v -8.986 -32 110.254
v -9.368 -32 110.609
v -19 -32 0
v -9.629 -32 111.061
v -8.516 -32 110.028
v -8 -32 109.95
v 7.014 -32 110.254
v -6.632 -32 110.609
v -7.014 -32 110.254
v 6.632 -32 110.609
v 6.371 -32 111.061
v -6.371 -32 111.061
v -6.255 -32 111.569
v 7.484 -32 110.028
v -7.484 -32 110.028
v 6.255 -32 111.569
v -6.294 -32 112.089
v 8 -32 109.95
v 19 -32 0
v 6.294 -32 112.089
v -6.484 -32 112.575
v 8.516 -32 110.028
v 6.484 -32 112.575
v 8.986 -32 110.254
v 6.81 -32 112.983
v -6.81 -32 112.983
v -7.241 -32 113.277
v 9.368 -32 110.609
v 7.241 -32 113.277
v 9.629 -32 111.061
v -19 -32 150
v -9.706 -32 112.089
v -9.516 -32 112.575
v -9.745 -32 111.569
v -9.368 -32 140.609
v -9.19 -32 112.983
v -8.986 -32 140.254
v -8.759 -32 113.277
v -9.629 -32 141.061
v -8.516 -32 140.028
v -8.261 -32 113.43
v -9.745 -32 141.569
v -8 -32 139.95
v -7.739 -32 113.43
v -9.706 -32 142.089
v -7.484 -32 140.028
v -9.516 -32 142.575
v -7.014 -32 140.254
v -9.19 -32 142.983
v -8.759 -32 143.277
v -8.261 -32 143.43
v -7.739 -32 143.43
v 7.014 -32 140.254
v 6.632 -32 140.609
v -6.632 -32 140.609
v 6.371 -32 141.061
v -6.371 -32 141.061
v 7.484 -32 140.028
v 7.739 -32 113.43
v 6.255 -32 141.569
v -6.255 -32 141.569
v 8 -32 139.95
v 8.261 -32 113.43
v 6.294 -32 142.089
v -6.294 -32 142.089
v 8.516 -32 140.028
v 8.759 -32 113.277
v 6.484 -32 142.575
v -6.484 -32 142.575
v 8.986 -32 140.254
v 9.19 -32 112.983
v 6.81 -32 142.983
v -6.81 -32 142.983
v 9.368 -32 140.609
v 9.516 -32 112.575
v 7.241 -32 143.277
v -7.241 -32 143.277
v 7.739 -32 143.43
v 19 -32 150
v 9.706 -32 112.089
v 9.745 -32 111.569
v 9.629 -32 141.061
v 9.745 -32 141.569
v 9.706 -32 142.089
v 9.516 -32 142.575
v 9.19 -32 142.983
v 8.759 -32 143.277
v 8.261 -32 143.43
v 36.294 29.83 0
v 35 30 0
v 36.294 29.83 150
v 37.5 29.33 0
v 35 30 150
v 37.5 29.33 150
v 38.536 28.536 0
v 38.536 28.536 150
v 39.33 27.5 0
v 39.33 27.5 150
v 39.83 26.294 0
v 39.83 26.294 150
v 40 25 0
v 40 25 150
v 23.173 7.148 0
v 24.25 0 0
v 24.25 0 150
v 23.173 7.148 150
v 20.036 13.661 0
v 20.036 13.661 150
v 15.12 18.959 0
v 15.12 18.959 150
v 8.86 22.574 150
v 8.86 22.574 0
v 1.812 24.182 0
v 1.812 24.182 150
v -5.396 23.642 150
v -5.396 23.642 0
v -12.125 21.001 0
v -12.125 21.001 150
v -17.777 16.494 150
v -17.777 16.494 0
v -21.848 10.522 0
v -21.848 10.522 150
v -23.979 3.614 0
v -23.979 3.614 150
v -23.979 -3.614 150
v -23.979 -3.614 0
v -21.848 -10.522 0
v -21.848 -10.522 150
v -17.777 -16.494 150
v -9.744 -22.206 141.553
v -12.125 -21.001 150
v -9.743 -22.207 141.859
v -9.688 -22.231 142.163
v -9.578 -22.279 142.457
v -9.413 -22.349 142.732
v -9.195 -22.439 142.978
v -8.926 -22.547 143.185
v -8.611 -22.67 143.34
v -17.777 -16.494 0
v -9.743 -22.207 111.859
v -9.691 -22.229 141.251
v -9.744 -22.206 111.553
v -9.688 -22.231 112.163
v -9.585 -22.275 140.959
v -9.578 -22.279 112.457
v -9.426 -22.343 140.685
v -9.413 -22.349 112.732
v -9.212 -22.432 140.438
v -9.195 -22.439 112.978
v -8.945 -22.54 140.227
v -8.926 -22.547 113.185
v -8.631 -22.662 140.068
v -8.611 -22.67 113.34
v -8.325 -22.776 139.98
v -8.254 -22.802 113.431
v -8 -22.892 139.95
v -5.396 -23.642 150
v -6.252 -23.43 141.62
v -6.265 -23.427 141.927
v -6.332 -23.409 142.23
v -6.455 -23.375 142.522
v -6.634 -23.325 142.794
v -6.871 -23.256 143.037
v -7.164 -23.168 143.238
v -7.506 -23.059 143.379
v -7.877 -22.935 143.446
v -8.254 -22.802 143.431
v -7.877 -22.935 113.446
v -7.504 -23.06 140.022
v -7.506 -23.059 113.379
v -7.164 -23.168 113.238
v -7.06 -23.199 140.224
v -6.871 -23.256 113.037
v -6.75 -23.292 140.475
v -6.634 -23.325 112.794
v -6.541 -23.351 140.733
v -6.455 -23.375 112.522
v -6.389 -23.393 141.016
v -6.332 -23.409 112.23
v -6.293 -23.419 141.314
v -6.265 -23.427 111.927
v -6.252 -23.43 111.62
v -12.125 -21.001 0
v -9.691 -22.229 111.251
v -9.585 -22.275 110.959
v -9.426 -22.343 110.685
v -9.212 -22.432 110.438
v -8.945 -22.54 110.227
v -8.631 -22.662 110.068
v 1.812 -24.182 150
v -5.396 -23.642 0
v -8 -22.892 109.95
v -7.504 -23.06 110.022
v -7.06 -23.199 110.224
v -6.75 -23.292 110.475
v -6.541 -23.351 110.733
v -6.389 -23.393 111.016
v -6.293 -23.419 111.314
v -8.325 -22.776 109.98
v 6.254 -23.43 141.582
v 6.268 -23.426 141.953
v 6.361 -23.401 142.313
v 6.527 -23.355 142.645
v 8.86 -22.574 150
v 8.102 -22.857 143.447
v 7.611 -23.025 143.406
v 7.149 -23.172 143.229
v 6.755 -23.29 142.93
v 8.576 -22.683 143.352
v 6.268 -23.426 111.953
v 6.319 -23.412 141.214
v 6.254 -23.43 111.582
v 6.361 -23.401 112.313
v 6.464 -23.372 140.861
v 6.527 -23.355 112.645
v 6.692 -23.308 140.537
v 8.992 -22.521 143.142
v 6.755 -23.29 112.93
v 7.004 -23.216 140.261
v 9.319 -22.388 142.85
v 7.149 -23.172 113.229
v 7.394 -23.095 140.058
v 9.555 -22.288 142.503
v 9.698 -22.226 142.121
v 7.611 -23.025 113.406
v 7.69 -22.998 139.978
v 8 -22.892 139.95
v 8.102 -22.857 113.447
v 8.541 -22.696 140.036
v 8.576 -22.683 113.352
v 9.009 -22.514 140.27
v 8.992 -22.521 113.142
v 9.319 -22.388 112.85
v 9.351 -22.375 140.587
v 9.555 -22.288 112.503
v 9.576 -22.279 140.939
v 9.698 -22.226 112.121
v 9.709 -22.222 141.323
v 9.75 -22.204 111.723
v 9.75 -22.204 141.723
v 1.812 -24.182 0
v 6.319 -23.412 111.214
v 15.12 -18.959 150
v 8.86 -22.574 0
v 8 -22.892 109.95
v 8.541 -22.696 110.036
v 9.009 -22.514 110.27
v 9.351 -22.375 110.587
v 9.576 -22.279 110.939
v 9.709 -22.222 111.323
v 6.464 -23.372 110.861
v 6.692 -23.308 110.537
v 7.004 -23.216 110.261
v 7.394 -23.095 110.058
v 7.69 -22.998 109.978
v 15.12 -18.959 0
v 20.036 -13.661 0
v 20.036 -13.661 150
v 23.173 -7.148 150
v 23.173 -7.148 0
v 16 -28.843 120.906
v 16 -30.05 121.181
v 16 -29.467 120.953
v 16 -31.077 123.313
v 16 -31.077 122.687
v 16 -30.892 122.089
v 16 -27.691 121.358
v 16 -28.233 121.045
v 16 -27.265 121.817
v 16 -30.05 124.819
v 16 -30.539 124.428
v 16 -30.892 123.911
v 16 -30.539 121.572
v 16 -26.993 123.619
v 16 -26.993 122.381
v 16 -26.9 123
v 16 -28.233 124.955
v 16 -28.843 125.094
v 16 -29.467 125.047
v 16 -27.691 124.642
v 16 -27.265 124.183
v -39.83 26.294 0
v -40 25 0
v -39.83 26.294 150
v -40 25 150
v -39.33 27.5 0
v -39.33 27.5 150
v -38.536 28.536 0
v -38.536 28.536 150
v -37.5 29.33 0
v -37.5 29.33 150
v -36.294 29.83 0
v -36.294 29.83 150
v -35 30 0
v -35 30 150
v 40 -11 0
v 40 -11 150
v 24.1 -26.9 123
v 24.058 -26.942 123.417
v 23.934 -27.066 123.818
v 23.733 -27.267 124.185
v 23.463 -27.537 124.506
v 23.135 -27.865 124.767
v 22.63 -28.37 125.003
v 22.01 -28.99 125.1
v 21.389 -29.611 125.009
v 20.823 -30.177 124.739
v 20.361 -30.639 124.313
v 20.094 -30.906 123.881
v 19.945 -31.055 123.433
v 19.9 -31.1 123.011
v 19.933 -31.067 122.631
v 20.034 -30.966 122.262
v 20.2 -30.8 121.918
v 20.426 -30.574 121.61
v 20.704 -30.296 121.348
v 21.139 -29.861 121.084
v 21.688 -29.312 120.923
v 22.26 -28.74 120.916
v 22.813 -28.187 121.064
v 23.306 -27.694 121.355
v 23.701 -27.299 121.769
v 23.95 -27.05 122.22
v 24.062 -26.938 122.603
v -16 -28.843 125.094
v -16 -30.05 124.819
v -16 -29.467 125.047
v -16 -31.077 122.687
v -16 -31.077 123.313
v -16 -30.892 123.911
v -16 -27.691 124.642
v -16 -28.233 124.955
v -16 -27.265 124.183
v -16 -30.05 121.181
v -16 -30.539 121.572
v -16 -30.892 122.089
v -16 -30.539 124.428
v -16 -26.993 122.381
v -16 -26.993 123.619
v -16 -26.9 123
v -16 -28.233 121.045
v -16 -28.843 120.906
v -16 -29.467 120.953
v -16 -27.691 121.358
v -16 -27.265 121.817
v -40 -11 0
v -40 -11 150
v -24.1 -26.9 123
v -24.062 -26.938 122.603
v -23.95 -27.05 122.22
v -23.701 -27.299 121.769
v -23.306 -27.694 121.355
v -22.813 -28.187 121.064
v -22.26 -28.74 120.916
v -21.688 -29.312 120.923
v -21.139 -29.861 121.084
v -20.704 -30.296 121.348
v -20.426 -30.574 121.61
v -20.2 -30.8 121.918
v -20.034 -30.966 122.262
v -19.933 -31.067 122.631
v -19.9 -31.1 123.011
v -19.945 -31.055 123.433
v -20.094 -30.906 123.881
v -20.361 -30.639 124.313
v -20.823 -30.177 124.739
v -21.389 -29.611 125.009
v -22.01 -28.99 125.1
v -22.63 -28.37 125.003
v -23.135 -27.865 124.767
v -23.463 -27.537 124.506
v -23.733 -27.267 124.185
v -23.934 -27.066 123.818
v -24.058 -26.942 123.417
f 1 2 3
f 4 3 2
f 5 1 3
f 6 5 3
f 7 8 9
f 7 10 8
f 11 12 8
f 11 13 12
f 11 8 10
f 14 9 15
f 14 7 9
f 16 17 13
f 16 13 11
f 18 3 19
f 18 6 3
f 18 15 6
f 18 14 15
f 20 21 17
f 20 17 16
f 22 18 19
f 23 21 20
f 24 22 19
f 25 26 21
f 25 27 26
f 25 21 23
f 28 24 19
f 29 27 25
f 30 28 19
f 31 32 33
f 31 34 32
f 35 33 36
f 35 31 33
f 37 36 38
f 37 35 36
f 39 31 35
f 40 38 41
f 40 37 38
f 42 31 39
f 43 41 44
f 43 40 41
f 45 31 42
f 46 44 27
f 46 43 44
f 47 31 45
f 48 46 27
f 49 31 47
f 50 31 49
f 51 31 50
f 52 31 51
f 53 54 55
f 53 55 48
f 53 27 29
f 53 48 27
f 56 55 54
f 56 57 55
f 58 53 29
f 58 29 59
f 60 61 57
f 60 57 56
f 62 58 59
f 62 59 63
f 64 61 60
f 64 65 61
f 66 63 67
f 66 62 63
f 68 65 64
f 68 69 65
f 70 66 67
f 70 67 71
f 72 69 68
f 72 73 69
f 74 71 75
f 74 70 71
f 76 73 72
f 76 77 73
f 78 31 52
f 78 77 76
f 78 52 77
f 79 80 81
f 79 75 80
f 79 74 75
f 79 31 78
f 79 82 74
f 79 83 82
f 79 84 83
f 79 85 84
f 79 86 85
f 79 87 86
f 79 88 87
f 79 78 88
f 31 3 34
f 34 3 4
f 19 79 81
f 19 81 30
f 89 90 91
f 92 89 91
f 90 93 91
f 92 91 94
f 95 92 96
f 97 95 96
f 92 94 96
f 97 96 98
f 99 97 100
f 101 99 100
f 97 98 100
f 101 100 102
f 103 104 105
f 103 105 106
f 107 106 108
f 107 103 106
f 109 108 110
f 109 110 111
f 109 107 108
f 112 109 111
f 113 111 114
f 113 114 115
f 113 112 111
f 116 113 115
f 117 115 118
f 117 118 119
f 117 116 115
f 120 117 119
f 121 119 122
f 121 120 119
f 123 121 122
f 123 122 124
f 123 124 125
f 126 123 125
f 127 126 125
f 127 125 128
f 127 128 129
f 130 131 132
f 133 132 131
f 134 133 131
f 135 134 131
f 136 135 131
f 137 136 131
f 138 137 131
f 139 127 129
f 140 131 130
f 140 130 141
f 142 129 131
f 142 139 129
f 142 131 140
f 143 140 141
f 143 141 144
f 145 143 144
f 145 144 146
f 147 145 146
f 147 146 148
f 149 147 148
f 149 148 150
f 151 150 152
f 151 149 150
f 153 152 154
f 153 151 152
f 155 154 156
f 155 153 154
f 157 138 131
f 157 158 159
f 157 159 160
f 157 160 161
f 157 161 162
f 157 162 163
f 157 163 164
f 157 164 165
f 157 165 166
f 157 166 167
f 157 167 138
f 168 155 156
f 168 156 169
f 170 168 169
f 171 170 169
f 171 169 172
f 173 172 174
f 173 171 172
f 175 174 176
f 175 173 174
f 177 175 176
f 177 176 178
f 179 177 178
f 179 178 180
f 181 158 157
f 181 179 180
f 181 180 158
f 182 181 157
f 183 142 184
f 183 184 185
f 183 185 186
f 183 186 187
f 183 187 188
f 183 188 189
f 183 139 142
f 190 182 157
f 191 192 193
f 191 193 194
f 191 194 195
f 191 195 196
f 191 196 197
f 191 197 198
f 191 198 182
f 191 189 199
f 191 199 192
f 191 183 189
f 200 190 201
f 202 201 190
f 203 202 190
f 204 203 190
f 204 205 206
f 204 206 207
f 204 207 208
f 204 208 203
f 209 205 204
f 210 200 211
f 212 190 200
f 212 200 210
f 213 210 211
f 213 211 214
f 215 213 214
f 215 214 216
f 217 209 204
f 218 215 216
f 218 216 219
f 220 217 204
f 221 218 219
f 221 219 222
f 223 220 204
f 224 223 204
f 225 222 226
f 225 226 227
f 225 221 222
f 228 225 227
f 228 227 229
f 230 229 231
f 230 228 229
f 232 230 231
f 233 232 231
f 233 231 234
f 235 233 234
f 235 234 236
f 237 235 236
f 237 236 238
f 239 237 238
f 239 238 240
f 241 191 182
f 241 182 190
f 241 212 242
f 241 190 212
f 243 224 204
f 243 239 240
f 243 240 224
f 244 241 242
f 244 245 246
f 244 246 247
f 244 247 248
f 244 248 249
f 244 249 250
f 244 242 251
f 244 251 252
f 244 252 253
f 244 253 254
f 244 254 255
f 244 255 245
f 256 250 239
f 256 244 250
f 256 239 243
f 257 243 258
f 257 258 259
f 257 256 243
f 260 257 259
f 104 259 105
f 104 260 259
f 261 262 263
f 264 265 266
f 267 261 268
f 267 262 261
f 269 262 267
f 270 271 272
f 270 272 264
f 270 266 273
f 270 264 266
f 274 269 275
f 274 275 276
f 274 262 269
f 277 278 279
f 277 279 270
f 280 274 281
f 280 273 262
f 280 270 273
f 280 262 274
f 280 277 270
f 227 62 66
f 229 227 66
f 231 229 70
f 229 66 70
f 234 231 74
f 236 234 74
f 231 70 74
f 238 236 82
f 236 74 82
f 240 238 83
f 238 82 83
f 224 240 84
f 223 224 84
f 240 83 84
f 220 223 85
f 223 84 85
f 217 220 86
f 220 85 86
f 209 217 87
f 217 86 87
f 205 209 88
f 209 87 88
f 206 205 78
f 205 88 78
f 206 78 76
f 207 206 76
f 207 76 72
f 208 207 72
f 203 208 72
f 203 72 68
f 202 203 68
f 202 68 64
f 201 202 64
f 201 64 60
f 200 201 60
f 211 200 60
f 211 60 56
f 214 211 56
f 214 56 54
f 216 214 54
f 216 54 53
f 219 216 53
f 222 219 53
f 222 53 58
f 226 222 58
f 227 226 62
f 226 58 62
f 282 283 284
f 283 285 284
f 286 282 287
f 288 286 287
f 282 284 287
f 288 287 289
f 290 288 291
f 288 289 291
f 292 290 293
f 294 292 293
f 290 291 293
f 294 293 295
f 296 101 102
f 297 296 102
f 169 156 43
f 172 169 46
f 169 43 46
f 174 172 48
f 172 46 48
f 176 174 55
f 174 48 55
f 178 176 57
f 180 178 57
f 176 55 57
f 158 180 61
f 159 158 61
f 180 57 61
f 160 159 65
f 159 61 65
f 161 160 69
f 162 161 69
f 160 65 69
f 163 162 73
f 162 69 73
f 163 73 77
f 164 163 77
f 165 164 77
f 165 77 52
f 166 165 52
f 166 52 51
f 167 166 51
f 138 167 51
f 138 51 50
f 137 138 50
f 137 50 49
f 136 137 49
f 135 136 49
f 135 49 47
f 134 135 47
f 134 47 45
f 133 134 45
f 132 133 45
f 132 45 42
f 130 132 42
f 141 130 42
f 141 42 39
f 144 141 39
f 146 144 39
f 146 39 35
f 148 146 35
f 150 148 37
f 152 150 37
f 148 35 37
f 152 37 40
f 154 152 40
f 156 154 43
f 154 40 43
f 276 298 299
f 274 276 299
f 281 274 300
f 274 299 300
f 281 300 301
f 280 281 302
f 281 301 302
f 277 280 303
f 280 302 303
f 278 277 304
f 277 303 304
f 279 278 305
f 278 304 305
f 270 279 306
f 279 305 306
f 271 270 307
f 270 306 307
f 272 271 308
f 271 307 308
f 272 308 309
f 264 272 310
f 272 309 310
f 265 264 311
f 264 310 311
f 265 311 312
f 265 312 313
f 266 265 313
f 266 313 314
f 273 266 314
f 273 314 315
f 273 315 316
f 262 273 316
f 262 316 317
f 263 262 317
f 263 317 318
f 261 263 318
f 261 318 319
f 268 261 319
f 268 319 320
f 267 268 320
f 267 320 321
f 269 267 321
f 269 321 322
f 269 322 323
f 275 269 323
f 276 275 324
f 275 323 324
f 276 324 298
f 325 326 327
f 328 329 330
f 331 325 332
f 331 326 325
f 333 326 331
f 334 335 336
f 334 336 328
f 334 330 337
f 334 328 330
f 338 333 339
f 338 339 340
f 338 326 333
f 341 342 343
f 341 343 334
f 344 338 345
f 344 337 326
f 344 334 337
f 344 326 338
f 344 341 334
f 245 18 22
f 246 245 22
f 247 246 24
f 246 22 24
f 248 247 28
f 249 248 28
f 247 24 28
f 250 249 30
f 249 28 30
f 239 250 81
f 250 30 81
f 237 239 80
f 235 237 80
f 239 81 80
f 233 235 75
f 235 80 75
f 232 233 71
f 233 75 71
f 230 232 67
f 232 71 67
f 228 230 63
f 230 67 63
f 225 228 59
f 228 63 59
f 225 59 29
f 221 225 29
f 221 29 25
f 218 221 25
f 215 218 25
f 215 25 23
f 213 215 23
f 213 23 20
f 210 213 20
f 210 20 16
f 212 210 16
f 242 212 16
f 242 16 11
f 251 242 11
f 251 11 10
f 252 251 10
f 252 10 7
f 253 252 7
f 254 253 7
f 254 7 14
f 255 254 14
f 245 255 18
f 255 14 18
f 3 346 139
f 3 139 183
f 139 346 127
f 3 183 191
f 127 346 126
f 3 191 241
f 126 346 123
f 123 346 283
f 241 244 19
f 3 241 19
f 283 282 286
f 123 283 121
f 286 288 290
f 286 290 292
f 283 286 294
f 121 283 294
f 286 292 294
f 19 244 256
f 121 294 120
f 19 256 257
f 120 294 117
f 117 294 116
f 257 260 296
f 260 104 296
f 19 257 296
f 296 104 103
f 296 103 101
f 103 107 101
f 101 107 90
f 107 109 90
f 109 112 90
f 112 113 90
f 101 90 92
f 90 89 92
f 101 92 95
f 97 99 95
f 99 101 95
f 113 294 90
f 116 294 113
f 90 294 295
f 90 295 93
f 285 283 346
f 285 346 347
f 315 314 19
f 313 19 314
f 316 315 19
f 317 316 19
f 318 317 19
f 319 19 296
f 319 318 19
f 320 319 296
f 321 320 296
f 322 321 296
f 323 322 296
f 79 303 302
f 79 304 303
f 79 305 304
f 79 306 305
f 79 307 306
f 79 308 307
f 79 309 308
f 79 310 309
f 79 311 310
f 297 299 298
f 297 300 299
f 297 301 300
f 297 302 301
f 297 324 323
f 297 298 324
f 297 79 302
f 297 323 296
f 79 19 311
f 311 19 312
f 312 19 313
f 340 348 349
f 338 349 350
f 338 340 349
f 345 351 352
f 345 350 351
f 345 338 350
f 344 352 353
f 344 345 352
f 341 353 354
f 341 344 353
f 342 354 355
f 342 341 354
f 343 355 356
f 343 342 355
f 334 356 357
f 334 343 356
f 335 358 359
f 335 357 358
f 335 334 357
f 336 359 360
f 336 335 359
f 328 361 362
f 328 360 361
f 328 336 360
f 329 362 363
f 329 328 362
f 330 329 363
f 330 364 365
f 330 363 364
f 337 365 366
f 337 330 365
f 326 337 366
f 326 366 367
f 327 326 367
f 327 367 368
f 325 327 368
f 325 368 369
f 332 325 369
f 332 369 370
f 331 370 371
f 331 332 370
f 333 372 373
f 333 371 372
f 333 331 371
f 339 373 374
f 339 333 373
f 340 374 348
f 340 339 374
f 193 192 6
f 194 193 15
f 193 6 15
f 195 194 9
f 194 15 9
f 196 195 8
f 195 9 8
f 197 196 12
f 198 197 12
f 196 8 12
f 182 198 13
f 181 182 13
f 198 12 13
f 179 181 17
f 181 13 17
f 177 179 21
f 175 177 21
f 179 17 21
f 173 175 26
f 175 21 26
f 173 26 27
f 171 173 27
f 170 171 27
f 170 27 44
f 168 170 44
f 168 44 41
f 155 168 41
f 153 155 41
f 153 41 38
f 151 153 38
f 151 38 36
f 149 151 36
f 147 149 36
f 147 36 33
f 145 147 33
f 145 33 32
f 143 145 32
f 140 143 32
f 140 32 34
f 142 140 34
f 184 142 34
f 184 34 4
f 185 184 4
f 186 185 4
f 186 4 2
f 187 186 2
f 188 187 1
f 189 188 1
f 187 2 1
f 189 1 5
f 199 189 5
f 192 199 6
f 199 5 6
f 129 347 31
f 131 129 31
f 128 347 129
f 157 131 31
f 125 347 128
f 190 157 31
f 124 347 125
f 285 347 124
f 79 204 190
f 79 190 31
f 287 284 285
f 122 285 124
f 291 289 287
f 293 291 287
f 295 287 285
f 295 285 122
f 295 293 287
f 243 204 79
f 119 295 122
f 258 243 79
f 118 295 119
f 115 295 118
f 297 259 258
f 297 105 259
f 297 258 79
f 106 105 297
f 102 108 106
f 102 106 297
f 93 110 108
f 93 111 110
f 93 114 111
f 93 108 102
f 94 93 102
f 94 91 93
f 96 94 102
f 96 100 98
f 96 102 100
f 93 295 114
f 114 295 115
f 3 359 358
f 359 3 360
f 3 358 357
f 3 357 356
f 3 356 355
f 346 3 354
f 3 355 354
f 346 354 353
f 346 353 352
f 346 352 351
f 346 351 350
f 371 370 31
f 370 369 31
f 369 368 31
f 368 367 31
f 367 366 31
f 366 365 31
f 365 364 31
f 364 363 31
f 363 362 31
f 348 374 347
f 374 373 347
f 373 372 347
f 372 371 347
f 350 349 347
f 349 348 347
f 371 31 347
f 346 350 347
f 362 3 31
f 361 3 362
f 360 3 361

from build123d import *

# Parameters (mm, degrees)
SKETCH1_W               = 80
SKETCH1_H               = 60
SKETCH1_R               = 24.25
BOSS_EXTRUDE1_DEPTH     = 150
SKETCH2_W               = 80
SKETCH2_H               = 150
BOSS_EXTRUDE2_DEPTH     = 2
CUT_EXTRUDE1_DEPTH      = 159.505520409
SKETCH4_R               = 2.1
CUT_EXTRUDE2_DEPTH      = 24
CUT_EXTRUDE3_START      = -24
SKETCH5_R               = 2.1
CUT_EXTRUDE3_DEPTH      = 24
CUT_EXTRUDE4_REACH      = 169.165
CUT_EXTRUDE4_END_RADIUS = 24.25
SKETCH6_R               = 1.75
FILLET1_R               = 5


with BuildPart() as part:
    # Sketch1 → Boss-Extrude1 (new body)
    with BuildSketch(Plane.XY):
        Rectangle(SKETCH1_W, SKETCH1_H)
        Circle(SKETCH1_R, mode=Mode.SUBTRACT)
    extrude(amount=BOSS_EXTRUDE1_DEPTH)

    # Sketch2 → Boss-Extrude2 (add)
    with BuildSketch(Plane.XZ.offset(30)):
        with Locations((0, 75)):
            Rectangle(SKETCH2_W, SKETCH2_H)
    extrude(amount=BOSS_EXTRUDE2_DEPTH)

    # Sketch3 → Cut-Extrude1 (cut, through all)
    with BuildSketch(Plane.XY.offset(150)):
        Polygon((-40, -11), (-40, -32), (-19, -32), align=None)
        Polygon((19, -32), (40, -11), (40, -32), align=None)
    extrude(amount=-CUT_EXTRUDE1_DEPTH, mode=Mode.SUBTRACT)

    # Sketch4 → Cut-Extrude2 (cut)
    with BuildSketch(Plane(origin=(40, 0, 0), x_dir=(0, 0, -1), z_dir=(1, 0, 0))):
        with Locations(Location((-123, -29, 0), (0, 0, 90))):
            Circle(SKETCH4_R)
    extrude(amount=-CUT_EXTRUDE2_DEPTH, mode=Mode.SUBTRACT)

    # Sketch5 → Cut-Extrude3 (cut)
    with BuildSketch(Plane.ZY.offset(40).offset(CUT_EXTRUDE3_START)):
        with Locations(Location((123, -29, 0), (0, 0, 90))):
            Circle(SKETCH5_R)
    extrude(amount=CUT_EXTRUDE3_DEPTH, mode=Mode.SUBTRACT)

    # Cut-Extrude4: up to this cylinder (the profile starts outside it)
    cut_extrude4_end = Plane(origin=(0, 0, 126.7), z_dir=(0, 0, -1)) * Cylinder(CUT_EXTRUDE4_END_RADIUS, 417.83, mode=Mode.PRIVATE)
    # Sketch6 → Cut-Extrude4 (cut, up to the surface)
    with BuildSketch(Plane.XZ.offset(32), mode=Mode.PRIVATE) as cut_extrude4_sk1:
        with Locations(Location((-8, 141.7, 0), (0, 0, 270))):
            Circle(SKETCH6_R)
    cut_extrude4_tool1 = extrude(cut_extrude4_sk1.sketch, amount=-CUT_EXTRUDE4_REACH, mode=Mode.PRIVATE) - cut_extrude4_end
    add(cut_extrude4_tool1.solids().sort_by_distance((-8, -32, 141.7))[0], mode=Mode.SUBTRACT)
    # Sketch6 → Cut-Extrude4 (cut, up to the surface)
    with BuildSketch(Plane.XZ.offset(32), mode=Mode.PRIVATE) as cut_extrude4_sk2:
        with Locations(Location((-8, 111.7, 0), (0, 0, 270))):
            Circle(SKETCH6_R)
    cut_extrude4_tool2 = extrude(cut_extrude4_sk2.sketch, amount=-CUT_EXTRUDE4_REACH, mode=Mode.PRIVATE) - cut_extrude4_end
    add(cut_extrude4_tool2.solids().sort_by_distance((-8, -32, 111.7))[0], mode=Mode.SUBTRACT)
    # Sketch6 → Cut-Extrude4 (cut, up to the surface)
    with BuildSketch(Plane.XZ.offset(32), mode=Mode.PRIVATE) as cut_extrude4_sk3:
        with Locations(Location((8, 111.7, 0), (0, 0, 270))):
            Circle(SKETCH6_R)
    cut_extrude4_tool3 = extrude(cut_extrude4_sk3.sketch, amount=-CUT_EXTRUDE4_REACH, mode=Mode.PRIVATE) - cut_extrude4_end
    add(cut_extrude4_tool3.solids().sort_by_distance((8, -32, 111.7))[0], mode=Mode.SUBTRACT)
    # Sketch6 → Cut-Extrude4 (cut, up to the surface)
    with BuildSketch(Plane.XZ.offset(32), mode=Mode.PRIVATE) as cut_extrude4_sk4:
        with Locations(Location((8, 141.7, 0), (0, 0, 270))):
            Circle(SKETCH6_R)
    cut_extrude4_tool4 = extrude(cut_extrude4_sk4.sketch, amount=-CUT_EXTRUDE4_REACH, mode=Mode.PRIVATE) - cut_extrude4_end
    add(cut_extrude4_tool4.solids().sort_by_distance((8, -32, 141.7))[0], mode=Mode.SUBTRACT)

    # Fillet1
    fillet1_edges = [part.edges().sort_by_distance(p)[0] for p in [
        (-40, 30, 75),
        (40, 30, 75),
    ]]
    fillet(fillet1_edges, radius=FILLET1_R)


solid = part.part
